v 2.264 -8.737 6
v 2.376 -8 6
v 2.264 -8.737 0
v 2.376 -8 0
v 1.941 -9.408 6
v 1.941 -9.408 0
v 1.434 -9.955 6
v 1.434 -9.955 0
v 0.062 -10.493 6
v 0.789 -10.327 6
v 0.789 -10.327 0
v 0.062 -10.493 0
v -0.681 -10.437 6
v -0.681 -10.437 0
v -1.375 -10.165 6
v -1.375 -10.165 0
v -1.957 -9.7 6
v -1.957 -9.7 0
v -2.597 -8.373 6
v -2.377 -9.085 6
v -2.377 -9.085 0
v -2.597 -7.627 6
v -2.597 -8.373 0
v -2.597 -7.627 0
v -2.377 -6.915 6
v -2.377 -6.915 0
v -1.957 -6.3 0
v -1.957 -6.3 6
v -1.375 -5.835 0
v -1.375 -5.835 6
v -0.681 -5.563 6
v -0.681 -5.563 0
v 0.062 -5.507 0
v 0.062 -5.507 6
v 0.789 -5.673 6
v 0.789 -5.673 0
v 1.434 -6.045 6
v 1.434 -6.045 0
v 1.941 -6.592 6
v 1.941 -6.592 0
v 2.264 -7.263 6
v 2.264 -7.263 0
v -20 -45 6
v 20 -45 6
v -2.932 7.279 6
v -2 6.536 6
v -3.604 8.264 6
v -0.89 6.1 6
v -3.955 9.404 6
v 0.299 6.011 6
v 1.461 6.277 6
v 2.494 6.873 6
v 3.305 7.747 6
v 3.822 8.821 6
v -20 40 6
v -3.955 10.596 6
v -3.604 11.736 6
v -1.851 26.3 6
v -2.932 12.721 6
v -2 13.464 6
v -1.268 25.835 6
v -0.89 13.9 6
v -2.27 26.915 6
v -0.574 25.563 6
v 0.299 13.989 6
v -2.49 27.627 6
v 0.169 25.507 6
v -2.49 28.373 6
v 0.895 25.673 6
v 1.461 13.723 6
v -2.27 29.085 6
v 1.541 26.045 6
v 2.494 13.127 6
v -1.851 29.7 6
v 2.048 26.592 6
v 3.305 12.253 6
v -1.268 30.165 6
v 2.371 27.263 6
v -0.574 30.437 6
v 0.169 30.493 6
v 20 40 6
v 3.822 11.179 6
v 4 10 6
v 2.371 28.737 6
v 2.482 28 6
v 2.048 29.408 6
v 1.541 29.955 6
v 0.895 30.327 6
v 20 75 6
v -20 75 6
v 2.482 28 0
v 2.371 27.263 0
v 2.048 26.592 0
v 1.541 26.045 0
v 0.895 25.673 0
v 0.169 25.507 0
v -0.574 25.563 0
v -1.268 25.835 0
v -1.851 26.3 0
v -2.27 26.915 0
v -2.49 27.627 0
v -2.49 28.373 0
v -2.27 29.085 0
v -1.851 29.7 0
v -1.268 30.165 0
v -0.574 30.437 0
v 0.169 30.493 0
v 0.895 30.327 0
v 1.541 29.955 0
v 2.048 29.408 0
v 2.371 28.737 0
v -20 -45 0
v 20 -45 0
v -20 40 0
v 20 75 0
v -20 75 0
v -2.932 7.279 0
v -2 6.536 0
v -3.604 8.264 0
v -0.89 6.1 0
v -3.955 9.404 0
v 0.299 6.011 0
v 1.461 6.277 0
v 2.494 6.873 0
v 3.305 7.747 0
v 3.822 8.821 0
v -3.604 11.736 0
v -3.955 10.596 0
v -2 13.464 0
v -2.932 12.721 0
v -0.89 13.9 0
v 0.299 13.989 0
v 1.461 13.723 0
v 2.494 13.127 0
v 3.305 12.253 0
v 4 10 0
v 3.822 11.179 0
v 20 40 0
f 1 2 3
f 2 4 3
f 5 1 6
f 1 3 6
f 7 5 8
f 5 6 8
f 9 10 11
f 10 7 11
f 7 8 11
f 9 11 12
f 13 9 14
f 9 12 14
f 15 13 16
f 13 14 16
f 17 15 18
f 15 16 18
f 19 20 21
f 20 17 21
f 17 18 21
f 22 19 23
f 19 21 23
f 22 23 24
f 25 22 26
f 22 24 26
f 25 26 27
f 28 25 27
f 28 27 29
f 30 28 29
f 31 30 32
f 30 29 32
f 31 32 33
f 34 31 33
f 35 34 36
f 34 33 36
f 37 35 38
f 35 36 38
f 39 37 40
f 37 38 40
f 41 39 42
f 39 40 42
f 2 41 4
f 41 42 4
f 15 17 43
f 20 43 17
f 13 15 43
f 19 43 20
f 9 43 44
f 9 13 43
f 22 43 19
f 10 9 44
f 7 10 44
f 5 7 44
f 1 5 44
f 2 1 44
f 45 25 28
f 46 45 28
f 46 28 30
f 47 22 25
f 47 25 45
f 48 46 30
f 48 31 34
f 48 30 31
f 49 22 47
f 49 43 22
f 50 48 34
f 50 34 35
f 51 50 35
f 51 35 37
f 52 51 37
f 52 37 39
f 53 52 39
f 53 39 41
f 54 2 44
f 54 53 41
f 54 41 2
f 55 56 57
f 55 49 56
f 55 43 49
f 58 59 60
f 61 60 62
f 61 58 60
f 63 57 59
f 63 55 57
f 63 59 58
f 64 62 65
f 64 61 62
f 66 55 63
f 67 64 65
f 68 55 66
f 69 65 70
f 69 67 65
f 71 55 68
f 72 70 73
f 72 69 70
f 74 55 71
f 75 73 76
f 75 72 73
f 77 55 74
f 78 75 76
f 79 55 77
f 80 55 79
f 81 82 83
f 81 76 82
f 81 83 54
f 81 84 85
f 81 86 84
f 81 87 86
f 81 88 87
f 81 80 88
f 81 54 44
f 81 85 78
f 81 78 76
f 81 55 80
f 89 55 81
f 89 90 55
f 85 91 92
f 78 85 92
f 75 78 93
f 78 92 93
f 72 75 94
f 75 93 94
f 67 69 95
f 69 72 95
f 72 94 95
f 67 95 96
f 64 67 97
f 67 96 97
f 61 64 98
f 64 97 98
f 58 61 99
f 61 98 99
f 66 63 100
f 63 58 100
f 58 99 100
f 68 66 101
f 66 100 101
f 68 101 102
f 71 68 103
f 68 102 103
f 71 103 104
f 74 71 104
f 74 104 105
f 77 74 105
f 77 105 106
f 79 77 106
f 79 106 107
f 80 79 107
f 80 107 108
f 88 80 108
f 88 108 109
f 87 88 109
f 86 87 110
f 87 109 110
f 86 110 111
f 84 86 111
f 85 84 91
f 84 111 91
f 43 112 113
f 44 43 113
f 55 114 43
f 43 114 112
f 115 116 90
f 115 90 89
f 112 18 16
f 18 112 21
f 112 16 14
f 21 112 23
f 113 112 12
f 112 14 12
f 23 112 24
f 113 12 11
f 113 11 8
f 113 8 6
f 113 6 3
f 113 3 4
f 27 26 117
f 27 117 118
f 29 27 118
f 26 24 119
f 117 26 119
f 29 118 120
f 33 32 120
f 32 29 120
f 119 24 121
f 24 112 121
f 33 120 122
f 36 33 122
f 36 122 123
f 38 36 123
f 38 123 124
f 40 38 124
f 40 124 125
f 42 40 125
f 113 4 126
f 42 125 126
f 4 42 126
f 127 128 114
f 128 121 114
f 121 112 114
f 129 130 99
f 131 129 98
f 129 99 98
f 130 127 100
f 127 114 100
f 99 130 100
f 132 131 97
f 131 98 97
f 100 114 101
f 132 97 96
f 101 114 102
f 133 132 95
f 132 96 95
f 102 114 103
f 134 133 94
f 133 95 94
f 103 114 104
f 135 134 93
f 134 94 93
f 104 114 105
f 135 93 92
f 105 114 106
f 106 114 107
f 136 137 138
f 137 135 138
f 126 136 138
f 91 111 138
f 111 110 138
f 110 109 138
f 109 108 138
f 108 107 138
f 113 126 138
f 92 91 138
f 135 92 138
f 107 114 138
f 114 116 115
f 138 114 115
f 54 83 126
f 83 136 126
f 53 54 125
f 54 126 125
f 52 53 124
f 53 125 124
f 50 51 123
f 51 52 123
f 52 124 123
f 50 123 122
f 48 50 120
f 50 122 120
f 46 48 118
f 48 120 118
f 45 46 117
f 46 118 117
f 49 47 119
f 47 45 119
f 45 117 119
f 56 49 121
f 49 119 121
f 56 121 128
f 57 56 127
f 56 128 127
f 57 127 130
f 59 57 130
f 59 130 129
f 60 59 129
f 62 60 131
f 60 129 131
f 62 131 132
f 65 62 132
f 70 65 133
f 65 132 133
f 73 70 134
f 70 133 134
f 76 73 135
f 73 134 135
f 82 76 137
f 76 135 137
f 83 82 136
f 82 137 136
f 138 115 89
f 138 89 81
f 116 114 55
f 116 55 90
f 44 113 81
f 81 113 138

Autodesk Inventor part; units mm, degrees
ref_plane "YZ Plane" through (0, 0, 0) normal (1, 0, 0) x (0, 1, 0)
ref_plane "XZ Plane" through (0, 0, 0) normal (0, 1, 0) x (-1, 0, 0)
ref_plane "XY Plane" through (0, 0, 0) normal (0, 0, 1) x (1, 0, 0)
sketch "Sketch1" plane through (0, 0, 0) normal (0, 0, 1) x (1, 0, 0)
  circle A0 centre (-0.1245, -8) radius 2.5
  circle A1 centre (-0.018, 28) radius 2.5
  line L0 (-20, 40) -> (-20, -45) projected
  line L1 (-20, -45) -> (20, -45) projected
  line L2 (20, -45) -> (20, 40) projected
  circle A2 centre (-0.1245, -8) radius 2.5 projected
  circle A3 centre (-0.018, 28) radius 2.5 projected
  line L3 (20, -45) -> (-20, -45)
  line L4 (-20, -45) -> (-20, 75)
  line L5 (-20, 75) -> (20, 75)
  line L6 (20, 75) -> (20, -45)
  circle A4 centre (0, 10) radius 4
  point P0 (0, 0)
  point P1 (20, 40)
  dimension "d0" = 120
  dimension "d1" = 8
extrude "Extrusion1" add sketch "Sketch1" along normal blind 6
properties part number "gard1" material "PMMA Plastic"
